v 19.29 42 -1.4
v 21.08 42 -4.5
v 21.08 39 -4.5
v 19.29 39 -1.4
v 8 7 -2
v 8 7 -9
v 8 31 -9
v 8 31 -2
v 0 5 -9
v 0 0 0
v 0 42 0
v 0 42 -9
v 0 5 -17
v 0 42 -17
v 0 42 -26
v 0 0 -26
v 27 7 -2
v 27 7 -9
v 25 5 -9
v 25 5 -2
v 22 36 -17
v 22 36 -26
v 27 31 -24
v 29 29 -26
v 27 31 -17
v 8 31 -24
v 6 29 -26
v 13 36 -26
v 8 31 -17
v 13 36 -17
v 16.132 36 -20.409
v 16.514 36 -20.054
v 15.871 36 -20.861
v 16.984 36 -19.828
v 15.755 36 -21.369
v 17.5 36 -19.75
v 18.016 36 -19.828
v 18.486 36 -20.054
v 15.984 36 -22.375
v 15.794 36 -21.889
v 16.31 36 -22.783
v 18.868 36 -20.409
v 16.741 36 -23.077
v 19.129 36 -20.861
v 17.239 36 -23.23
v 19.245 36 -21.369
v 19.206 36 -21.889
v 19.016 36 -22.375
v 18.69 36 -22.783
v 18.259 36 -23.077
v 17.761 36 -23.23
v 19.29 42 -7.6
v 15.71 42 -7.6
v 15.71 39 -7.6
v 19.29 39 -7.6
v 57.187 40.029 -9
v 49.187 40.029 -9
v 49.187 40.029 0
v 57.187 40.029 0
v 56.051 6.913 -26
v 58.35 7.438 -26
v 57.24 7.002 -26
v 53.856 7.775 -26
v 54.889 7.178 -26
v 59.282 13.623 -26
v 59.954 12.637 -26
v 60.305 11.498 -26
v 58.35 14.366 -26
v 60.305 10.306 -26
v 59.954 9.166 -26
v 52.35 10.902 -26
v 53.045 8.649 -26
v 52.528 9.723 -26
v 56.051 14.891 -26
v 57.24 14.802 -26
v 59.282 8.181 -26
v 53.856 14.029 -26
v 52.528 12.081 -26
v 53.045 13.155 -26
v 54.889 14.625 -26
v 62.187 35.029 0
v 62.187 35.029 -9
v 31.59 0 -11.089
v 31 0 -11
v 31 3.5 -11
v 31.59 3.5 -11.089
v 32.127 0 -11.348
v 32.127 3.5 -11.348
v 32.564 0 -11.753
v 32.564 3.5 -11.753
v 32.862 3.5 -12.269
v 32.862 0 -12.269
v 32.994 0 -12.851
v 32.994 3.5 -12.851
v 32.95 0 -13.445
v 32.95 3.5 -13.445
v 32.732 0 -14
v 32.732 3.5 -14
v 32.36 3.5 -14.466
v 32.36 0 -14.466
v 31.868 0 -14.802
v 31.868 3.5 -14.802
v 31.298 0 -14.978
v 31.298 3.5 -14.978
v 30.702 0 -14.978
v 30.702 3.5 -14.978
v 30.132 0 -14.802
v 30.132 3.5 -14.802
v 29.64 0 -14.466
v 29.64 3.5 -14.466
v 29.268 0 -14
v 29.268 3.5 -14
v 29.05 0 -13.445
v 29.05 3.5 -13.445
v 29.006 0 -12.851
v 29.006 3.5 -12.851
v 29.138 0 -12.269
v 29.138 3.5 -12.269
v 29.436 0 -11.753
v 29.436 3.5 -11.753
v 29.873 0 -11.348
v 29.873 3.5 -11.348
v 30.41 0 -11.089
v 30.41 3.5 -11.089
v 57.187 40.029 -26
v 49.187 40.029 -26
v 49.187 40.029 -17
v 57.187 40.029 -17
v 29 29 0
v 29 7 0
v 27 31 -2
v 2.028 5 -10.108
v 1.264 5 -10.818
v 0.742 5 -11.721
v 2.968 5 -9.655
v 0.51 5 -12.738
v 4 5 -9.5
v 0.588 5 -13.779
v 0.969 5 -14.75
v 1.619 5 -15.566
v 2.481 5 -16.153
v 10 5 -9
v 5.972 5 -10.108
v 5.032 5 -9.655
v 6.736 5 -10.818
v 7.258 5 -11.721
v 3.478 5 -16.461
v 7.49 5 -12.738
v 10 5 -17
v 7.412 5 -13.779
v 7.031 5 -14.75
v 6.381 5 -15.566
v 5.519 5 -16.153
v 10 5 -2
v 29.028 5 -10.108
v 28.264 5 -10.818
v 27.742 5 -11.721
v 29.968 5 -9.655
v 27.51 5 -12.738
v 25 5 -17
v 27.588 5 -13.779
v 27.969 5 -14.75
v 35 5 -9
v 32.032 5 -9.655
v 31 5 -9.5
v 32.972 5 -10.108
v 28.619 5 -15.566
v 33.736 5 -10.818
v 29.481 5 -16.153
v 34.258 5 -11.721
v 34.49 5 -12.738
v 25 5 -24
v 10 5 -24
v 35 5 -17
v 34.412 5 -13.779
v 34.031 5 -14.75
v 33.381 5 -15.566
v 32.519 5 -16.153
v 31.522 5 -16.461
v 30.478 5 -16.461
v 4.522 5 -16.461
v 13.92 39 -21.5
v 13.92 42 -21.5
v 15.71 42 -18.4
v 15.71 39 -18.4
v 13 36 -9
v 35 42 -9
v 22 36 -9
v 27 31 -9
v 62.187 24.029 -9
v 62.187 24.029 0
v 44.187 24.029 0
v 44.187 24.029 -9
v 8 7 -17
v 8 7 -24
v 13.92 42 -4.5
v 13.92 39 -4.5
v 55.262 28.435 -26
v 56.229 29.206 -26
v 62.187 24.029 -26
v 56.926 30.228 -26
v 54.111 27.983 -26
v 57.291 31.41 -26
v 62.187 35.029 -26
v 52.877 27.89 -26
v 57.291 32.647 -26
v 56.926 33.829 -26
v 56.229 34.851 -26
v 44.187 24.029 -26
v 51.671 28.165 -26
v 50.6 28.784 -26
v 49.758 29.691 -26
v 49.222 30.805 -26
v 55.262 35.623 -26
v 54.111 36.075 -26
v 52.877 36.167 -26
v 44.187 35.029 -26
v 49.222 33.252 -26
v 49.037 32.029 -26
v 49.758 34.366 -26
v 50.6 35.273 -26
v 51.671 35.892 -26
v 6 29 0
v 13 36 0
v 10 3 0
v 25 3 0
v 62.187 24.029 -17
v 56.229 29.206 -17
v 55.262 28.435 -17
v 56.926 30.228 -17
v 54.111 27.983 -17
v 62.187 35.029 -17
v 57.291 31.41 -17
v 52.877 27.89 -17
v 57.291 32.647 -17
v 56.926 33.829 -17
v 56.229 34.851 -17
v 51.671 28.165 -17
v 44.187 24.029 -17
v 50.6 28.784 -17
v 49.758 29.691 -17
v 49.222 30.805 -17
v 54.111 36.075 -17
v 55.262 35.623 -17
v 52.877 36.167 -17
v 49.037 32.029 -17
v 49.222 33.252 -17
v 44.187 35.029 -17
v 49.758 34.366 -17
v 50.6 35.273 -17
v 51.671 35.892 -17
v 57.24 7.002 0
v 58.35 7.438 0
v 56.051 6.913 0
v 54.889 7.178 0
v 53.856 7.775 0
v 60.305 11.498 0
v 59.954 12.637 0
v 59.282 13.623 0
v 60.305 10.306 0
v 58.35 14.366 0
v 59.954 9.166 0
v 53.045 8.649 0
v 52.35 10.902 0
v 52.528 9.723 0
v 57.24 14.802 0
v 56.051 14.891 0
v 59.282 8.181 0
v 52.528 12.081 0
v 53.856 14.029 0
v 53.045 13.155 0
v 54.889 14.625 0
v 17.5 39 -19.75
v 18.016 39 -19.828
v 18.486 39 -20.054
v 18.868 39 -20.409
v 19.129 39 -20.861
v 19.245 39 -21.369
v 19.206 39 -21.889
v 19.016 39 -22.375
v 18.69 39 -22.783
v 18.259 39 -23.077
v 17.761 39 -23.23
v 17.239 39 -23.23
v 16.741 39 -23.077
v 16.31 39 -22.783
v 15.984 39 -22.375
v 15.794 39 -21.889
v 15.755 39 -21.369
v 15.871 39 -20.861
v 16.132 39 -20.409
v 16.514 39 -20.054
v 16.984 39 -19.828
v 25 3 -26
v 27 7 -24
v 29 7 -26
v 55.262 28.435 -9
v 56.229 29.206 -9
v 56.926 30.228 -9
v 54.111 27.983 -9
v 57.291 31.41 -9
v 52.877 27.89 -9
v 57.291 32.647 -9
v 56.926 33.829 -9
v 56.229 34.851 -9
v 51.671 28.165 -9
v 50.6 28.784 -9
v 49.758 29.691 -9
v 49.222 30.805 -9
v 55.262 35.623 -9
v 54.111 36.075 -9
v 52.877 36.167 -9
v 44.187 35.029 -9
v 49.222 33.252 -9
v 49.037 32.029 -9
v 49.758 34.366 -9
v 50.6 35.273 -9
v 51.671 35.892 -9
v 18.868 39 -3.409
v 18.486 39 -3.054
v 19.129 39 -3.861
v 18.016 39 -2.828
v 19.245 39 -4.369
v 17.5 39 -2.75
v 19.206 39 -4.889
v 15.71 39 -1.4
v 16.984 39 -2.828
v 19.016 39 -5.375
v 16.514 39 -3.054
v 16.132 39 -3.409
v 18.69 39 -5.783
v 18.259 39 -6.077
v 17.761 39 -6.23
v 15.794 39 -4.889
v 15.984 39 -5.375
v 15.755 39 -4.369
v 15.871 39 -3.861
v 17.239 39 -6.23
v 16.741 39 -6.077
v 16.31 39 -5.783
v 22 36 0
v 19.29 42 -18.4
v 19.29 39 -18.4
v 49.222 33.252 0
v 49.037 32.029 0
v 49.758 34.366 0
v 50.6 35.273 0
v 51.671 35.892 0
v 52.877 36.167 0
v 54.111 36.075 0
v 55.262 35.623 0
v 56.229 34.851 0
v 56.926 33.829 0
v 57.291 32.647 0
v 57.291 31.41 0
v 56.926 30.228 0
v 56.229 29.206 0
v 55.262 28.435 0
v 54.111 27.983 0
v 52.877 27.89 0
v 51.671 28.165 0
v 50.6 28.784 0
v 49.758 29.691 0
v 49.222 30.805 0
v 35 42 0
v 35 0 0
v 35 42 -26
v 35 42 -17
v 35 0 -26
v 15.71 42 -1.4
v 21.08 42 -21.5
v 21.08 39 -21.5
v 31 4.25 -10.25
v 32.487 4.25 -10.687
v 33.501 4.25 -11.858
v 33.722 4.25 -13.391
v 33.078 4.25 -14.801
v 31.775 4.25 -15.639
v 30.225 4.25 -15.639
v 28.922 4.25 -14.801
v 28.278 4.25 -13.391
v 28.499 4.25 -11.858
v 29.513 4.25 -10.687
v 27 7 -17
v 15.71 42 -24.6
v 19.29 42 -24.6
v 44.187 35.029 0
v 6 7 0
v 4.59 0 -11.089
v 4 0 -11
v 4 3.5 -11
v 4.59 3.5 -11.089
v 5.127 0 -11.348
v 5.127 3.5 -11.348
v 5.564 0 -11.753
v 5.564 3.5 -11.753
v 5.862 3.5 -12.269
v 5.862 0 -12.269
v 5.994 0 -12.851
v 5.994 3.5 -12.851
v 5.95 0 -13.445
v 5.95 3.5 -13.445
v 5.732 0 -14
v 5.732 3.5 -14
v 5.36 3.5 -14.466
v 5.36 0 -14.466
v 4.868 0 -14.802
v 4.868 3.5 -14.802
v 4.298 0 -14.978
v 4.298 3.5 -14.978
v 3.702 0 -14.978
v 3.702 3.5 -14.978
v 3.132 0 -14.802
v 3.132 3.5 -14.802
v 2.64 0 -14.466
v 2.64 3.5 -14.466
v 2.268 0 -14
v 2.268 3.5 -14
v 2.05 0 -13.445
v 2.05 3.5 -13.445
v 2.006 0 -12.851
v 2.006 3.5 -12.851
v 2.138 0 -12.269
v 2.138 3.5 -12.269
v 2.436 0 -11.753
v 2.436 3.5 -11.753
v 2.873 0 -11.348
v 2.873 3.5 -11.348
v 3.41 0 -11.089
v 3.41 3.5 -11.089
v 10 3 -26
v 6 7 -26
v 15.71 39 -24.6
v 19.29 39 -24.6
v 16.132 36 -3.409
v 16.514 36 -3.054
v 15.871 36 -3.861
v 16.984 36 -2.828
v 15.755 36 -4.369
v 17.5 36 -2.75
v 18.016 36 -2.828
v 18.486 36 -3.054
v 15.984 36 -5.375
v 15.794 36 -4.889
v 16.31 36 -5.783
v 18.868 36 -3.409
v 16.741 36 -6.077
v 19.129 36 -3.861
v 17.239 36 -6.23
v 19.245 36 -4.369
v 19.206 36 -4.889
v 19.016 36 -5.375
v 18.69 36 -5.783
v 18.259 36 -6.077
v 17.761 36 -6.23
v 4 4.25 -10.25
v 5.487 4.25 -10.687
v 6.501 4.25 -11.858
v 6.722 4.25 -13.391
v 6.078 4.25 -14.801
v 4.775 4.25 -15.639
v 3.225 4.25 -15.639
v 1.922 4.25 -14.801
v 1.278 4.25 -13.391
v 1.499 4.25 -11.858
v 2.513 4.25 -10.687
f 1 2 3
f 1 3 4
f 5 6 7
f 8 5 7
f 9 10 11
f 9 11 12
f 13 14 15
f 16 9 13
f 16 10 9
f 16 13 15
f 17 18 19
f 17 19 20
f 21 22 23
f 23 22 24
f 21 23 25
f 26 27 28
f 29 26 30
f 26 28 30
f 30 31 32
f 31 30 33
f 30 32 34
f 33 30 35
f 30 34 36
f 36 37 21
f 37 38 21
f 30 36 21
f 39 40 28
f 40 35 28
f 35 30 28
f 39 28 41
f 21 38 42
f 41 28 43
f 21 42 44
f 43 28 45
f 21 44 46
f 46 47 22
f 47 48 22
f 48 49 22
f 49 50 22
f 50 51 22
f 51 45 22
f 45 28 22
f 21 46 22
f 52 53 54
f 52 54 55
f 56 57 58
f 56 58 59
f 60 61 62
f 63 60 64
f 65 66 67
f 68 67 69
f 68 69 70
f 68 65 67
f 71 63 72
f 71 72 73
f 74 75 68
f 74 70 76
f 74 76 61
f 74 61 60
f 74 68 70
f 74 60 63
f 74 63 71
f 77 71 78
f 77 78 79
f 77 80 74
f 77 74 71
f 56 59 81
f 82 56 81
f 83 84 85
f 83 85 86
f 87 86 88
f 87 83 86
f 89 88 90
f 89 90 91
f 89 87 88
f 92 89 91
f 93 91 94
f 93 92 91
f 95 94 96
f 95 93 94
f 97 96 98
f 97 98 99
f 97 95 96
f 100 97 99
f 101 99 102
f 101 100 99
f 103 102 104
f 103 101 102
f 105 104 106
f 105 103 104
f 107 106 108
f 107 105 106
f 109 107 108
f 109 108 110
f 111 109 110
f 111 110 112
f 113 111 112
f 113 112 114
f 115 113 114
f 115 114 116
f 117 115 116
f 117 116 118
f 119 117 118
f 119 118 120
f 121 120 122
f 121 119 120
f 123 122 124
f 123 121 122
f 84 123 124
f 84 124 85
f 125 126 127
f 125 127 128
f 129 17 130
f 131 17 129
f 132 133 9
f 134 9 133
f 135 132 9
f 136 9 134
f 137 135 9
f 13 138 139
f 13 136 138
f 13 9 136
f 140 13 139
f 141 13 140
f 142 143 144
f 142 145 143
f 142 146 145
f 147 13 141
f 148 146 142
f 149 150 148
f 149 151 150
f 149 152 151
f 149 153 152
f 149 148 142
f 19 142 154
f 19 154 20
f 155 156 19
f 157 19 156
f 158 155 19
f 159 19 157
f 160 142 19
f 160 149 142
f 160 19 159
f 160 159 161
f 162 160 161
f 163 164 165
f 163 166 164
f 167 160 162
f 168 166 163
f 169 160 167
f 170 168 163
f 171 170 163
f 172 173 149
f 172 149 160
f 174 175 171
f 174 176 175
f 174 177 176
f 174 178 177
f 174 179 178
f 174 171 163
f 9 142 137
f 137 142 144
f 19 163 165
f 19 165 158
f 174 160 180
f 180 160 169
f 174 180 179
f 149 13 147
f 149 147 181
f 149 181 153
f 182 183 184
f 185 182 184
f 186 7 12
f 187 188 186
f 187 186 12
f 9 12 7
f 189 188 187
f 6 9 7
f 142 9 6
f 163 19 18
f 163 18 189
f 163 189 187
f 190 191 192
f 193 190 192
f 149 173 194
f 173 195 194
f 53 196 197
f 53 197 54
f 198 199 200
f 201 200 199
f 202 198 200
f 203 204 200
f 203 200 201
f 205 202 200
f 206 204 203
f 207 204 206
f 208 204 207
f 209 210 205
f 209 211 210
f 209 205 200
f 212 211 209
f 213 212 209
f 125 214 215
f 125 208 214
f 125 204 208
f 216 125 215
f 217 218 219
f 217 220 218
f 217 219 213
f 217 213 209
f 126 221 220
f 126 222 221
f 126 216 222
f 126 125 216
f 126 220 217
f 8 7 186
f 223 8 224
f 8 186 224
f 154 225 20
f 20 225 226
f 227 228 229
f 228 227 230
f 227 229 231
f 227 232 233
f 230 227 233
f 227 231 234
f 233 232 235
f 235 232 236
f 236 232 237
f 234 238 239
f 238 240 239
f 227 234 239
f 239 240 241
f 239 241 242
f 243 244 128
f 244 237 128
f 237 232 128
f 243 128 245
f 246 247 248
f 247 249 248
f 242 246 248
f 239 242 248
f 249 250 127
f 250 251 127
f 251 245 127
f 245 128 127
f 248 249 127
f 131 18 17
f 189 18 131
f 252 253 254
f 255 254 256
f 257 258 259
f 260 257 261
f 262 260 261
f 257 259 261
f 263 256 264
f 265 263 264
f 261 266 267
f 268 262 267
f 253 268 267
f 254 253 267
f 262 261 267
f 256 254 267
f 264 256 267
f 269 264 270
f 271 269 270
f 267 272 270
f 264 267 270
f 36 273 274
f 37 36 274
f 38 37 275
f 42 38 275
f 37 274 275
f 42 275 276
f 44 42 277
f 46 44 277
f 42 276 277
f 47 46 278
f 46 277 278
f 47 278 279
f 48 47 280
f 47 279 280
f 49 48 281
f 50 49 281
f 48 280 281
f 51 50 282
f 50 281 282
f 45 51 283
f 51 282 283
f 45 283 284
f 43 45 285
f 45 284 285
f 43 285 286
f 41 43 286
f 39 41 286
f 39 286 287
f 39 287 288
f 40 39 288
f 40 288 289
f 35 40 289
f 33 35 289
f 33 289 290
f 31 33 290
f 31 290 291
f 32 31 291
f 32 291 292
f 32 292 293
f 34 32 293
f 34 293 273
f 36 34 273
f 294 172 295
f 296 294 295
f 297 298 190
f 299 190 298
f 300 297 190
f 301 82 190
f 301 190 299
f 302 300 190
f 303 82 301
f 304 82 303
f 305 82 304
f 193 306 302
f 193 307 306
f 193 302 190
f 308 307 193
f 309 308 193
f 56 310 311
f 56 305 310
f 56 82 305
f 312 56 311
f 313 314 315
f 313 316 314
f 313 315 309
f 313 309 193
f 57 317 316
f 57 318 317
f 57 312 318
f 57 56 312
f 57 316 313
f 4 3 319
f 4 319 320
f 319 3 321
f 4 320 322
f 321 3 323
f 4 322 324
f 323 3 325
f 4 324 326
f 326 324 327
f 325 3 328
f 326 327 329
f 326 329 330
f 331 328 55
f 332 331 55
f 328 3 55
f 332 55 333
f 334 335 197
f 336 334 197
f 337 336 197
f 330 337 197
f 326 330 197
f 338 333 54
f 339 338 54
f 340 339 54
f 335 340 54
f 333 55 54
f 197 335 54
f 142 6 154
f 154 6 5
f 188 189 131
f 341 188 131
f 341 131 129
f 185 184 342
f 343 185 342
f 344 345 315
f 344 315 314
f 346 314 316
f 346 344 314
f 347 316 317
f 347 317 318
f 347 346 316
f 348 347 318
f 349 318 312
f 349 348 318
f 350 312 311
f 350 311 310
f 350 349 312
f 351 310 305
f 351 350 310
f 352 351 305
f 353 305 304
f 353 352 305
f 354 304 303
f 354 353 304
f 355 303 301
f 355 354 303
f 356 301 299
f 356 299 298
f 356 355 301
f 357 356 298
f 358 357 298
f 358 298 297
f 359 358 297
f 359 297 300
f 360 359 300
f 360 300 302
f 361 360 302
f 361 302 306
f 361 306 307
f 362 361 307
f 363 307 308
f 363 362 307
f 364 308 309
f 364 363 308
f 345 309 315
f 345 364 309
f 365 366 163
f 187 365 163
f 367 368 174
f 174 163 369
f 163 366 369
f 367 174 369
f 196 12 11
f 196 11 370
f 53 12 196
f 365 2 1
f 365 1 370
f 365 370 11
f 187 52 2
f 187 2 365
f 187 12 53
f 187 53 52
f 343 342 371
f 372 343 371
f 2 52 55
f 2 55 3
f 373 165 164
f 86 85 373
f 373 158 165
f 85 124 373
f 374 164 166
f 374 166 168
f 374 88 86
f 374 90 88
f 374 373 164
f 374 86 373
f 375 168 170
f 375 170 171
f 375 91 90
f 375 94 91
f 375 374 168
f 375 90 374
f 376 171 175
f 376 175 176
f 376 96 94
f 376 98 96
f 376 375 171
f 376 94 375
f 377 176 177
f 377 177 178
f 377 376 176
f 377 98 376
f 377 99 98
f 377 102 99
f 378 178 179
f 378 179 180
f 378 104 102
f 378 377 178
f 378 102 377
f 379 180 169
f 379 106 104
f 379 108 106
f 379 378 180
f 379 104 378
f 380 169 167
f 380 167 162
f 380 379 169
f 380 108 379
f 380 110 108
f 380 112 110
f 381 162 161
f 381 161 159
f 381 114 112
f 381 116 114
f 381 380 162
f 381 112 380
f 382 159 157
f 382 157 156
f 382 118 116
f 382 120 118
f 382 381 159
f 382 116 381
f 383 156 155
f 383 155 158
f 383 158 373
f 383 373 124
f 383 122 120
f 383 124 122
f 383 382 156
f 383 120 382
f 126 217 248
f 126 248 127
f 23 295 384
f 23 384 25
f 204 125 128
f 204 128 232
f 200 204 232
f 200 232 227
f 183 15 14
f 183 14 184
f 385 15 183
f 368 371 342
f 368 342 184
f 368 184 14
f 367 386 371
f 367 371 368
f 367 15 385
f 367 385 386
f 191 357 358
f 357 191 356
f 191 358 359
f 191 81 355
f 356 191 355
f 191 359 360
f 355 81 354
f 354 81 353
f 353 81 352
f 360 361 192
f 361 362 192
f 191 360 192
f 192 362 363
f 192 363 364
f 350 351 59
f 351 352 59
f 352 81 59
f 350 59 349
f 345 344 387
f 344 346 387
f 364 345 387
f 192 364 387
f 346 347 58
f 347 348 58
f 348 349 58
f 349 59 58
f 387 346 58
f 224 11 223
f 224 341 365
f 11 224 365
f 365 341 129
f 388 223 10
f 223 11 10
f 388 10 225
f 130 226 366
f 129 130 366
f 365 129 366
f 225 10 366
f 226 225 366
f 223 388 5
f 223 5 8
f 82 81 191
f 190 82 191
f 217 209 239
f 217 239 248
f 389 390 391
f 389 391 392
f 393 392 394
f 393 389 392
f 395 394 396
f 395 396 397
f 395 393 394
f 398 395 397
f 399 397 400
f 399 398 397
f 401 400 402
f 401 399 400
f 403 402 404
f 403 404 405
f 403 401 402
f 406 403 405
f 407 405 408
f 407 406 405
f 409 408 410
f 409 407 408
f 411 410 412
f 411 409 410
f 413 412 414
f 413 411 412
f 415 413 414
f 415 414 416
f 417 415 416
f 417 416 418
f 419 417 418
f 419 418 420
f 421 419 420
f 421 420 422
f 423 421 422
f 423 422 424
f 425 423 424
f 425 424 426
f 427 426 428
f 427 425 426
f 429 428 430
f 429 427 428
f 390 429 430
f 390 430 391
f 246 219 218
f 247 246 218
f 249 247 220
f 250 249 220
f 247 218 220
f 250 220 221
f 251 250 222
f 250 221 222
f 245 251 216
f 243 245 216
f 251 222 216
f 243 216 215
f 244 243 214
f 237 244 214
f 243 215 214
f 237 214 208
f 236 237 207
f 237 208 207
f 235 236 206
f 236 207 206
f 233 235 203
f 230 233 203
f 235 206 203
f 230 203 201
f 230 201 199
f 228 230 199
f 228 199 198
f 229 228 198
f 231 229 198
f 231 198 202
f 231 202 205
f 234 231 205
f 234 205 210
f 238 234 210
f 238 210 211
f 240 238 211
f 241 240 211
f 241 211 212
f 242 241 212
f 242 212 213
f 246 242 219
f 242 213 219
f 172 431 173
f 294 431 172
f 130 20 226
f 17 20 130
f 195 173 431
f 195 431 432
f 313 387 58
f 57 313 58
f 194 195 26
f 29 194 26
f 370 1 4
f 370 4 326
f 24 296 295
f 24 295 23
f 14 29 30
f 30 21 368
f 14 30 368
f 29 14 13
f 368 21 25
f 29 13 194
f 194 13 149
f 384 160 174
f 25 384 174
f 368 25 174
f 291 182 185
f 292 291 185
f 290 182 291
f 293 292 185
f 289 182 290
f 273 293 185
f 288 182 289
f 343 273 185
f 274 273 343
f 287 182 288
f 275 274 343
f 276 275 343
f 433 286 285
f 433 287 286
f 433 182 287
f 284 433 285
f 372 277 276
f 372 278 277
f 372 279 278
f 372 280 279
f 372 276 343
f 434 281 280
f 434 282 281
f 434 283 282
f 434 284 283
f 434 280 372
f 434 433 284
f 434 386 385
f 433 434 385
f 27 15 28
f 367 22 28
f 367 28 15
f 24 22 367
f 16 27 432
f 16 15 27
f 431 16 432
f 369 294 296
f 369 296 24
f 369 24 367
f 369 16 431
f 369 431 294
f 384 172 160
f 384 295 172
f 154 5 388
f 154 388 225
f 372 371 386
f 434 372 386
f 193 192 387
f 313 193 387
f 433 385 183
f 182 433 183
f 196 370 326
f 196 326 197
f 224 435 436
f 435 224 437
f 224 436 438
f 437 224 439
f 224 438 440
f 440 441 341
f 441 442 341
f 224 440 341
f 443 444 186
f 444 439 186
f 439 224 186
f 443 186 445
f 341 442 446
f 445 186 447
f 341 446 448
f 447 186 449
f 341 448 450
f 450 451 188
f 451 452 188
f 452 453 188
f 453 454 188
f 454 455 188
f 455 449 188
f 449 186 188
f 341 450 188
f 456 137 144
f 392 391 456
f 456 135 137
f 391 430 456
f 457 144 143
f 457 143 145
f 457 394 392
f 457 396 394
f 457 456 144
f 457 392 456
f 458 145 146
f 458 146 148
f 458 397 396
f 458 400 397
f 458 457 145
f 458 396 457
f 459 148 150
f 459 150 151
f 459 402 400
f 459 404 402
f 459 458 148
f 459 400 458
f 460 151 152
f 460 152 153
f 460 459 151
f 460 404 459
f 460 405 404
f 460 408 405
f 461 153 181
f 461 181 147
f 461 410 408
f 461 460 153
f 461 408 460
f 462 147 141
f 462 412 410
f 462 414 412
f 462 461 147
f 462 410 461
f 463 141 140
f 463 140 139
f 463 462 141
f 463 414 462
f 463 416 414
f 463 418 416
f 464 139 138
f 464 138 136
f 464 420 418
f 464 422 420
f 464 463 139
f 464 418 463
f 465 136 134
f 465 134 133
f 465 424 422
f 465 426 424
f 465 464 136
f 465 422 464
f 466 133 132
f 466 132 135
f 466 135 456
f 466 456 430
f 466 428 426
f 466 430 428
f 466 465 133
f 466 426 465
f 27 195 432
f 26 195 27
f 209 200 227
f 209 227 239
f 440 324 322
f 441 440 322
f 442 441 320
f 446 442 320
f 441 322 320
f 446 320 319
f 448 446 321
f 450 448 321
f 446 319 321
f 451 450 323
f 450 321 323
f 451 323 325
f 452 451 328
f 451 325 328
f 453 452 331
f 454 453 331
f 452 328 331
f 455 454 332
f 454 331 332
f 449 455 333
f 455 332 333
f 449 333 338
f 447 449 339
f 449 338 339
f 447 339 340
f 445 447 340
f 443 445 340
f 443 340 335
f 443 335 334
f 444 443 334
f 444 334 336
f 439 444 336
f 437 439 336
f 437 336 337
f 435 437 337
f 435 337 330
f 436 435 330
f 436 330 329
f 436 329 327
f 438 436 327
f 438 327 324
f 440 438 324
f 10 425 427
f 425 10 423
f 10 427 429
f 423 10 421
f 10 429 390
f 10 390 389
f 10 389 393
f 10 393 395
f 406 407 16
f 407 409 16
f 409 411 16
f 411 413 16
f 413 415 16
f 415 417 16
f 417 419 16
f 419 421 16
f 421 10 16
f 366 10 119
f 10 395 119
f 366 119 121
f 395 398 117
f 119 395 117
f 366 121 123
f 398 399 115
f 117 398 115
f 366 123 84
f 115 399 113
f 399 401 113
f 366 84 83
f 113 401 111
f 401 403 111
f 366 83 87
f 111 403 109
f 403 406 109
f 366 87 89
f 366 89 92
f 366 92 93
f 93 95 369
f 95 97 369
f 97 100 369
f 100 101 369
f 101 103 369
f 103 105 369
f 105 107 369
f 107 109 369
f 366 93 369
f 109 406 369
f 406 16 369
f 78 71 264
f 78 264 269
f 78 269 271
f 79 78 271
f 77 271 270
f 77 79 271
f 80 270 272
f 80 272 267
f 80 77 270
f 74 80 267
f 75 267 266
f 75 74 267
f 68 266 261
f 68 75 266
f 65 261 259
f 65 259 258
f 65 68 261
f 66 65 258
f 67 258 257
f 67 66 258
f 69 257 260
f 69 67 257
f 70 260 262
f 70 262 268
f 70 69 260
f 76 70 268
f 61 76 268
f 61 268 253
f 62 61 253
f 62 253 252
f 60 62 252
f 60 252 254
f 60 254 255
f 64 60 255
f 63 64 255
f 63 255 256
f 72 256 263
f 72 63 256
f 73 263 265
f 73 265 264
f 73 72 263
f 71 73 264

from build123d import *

# Parameters (mm, degrees)
SKETCH1_W               = 35
SKETCH1_H               = 9
SKETCH1_H_2             = 8
SKETCH1_R               = 2
SKETCH1_R_2             = 1.75
BOSS_EXTRUDE1_DEPTH     = 5
SKETCH1_3_W             = 35
SKETCH1_3_H             = 9
SKETCH1_3_R             = 1.75
BOSS_EXTRUDE2_DEPTH     = 42
CUT_EXTRUDE1_START      = 42
SKETCH1_4_R             = 1.75
CUT_EXTRUDE1_DEPTH      = 3
CUT_EXTRUDE2_START      = 42
SKETCH1_5_R             = 1.75
CUT_EXTRUDE2_DEPTH      = 37
CUT_EXTRUDE3_DEPTH      = 61.539243471
CUT_EXTRUDE3_DEPTH_BACK = 61.539243471
SKETCH2_W               = 19
SKETCH2_H               = 31
SKETCH2_R               = 4.15
CHAMFER1_SIZE           = 5
SKETCH3_R               = 4.15
BOSS_EXTRUDE3_DEPTH     = 9
CHAMFER2_SIZE           = 1.5
SKETCH4_R               = 4
BOSS_EXTRUDE4_DEPTH     = 26
CHAMFER3_SIZE           = 2


with BuildPart() as part:
    # Sketch1 → Boss-Extrude1 (new body)
    # profile 1 of 7: a face of its own
    with BuildSketch(Plane(origin=(0, 0, 0), x_dir=(1, 0, 0), z_dir=(0, 1, 0))):
        with Locations((17.5, 21.5)):
            Rectangle(SKETCH1_W, SKETCH1_H)
        Polygon((19.289785834, 18.4), (15.710214166, 18.4), (13.920428331, 21.5), (15.710214166, 24.6), (19.289785834, 24.6), (21.079571669, 21.5), align=None, mode=Mode.SUBTRACT)
    # profile 2 of 7: a face of its own
    with BuildSketch(Plane(origin=(0, 0, 0), x_dir=(1, 0, 0), z_dir=(0, 1, 0))):
        with Locations((17.5, 13)):
            Rectangle(SKETCH1_W, SKETCH1_H_2)
        with Locations(Location((4, 13, 0), (0, 0, 270))):
            Circle(SKETCH1_R, mode=Mode.SUBTRACT)
        with Locations(Location((31, 13, 0), (0, 0, 270))):
            Circle(SKETCH1_R, mode=Mode.SUBTRACT)
    # profile 3 of 7: a face of its own
    with BuildSketch(Plane(origin=(0, 0, 0), x_dir=(1, 0, 0), z_dir=(0, 1, 0))):
        with Locations((17.5, 4.5)):
            Rectangle(SKETCH1_W, SKETCH1_H)
        Polygon((19.289785834, 7.6), (21.079571669, 4.5), (19.289785834, 1.4), (15.710214166, 1.4), (13.920428331, 4.5), (15.710214166, 7.6), align=None, mode=Mode.SUBTRACT)
    # profile 4 of 7: a face of its own
    with BuildSketch(Plane(origin=(0, 0, 0), x_dir=(1, 0, 0), z_dir=(0, 1, 0))):
        Polygon((15.710214166, 24.6), (13.920428331, 21.5), (15.710214166, 18.4), (19.289785834, 18.4), (21.079571669, 21.5), (19.289785834, 24.6), align=None)
        with Locations((17.5, 21.5)):
            Circle(SKETCH1_R_2, mode=Mode.SUBTRACT)
    # profile 5 of 7: a face of its own
    with BuildSketch(Plane(origin=(0, 0, 0), x_dir=(1, 0, 0), z_dir=(0, 1, 0))):
        Polygon((19.289785834, 1.4), (15.710214166, 1.4), (13.920428331, 4.5), (15.710214166, 7.6), (19.289785834, 7.6), (21.079571669, 4.5), align=None)
        with Locations((17.5, 4.5)):
            Circle(SKETCH1_R_2, mode=Mode.SUBTRACT)
    # profile 6 of 7: a face of its own
    with BuildSketch(Plane(origin=(0, 0, 0), x_dir=(1, 0, 0), z_dir=(0, 1, 0))):
        with Locations((17.5, 4.5)):
            Circle(SKETCH1_R_2)
    # profile 7 of 7: a face of its own
    with BuildSketch(Plane(origin=(0, 0, 0), x_dir=(1, 0, 0), z_dir=(0, 1, 0))):
        with Locations((17.5, 21.5)):
            Circle(SKETCH1_R_2)
    extrude(amount=BOSS_EXTRUDE1_DEPTH)

    # Sketch1<3> → Boss-Extrude2 (add)
    # profile 1 of 6: a face of its own
    with BuildSketch(Plane(origin=(0, 0, 0), x_dir=(1, 0, 0), z_dir=(0, 1, 0))):
        with Locations((17.5, 21.5)):
            Rectangle(SKETCH1_3_W, SKETCH1_3_H)
        Polygon((19.289785834, 18.4), (15.710214166, 18.4), (13.920428331, 21.5), (15.710214166, 24.6), (19.289785834, 24.6), (21.079571669, 21.5), align=None, mode=Mode.SUBTRACT)
    # profile 2 of 6: a face of its own
    with BuildSketch(Plane(origin=(0, 0, 0), x_dir=(1, 0, 0), z_dir=(0, 1, 0))):
        with Locations((17.5, 4.5)):
            Rectangle(SKETCH1_3_W, SKETCH1_3_H)
        Polygon((19.289785834, 7.6), (21.079571669, 4.5), (19.289785834, 1.4), (15.710214166, 1.4), (13.920428331, 4.5), (15.710214166, 7.6), align=None, mode=Mode.SUBTRACT)
    # profile 3 of 6: a face of its own
    with BuildSketch(Plane(origin=(0, 0, 0), x_dir=(1, 0, 0), z_dir=(0, 1, 0))):
        Polygon((15.710214166, 24.6), (13.920428331, 21.5), (15.710214166, 18.4), (19.289785834, 18.4), (21.079571669, 21.5), (19.289785834, 24.6), align=None)
        with Locations((17.5, 21.5)):
            Circle(SKETCH1_3_R, mode=Mode.SUBTRACT)
    # profile 4 of 6: a face of its own
    with BuildSketch(Plane(origin=(0, 0, 0), x_dir=(1, 0, 0), z_dir=(0, 1, 0))):
        Polygon((19.289785834, 1.4), (15.710214166, 1.4), (13.920428331, 4.5), (15.710214166, 7.6), (19.289785834, 7.6), (21.079571669, 4.5), align=None)
        with Locations((17.5, 4.5)):
            Circle(SKETCH1_3_R, mode=Mode.SUBTRACT)
    # profile 5 of 6: a face of its own
    with BuildSketch(Plane(origin=(0, 0, 0), x_dir=(1, 0, 0), z_dir=(0, 1, 0))):
        with Locations((17.5, 4.5)):
            Circle(SKETCH1_3_R)
    # profile 6 of 6: a face of its own
    with BuildSketch(Plane(origin=(0, 0, 0), x_dir=(1, 0, 0), z_dir=(0, 1, 0))):
        with Locations((17.5, 21.5)):
            Circle(SKETCH1_3_R)
    extrude(amount=BOSS_EXTRUDE2_DEPTH)

    # Sketch1<4> → Cut-Extrude1 (cut)
    # profile 1 of 4: a face of its own
    with BuildSketch(Plane(origin=(0, 0, 0), x_dir=(1, 0, 0), z_dir=(0, 1, 0)).offset(CUT_EXTRUDE1_START)):
        Polygon((15.710214166, 24.6), (13.920428331, 21.5), (15.710214166, 18.4), (19.289785834, 18.4), (21.079571669, 21.5), (19.289785834, 24.6), align=None)
        with Locations((17.5, 21.5)):
            Circle(SKETCH1_4_R, mode=Mode.SUBTRACT)
    # profile 2 of 4: a face of its own
    with BuildSketch(Plane(origin=(0, 0, 0), x_dir=(1, 0, 0), z_dir=(0, 1, 0)).offset(CUT_EXTRUDE1_START)):
        Polygon((19.289785834, 1.4), (15.710214166, 1.4), (13.920428331, 4.5), (15.710214166, 7.6), (19.289785834, 7.6), (21.079571669, 4.5), align=None)
        with Locations((17.5, 4.5)):
            Circle(SKETCH1_4_R, mode=Mode.SUBTRACT)
    # profile 3 of 4: a face of its own
    with BuildSketch(Plane(origin=(0, 0, 0), x_dir=(1, 0, 0), z_dir=(0, 1, 0)).offset(CUT_EXTRUDE1_START)):
        with Locations((17.5, 4.5)):
            Circle(SKETCH1_4_R)
    # profile 4 of 4: a face of its own
    with BuildSketch(Plane(origin=(0, 0, 0), x_dir=(1, 0, 0), z_dir=(0, 1, 0)).offset(CUT_EXTRUDE1_START)):
        with Locations((17.5, 21.5)):
            Circle(SKETCH1_4_R)
    extrude(amount=-CUT_EXTRUDE1_DEPTH, mode=Mode.SUBTRACT)

    # Sketch1<5> → Cut-Extrude2 (cut)
    with BuildSketch(Plane(origin=(0, 0, 0), x_dir=(1, 0, 0), z_dir=(0, 1, 0)).offset(CUT_EXTRUDE2_START)):
        with Locations(Location((17.5, 21.5, 0), (0, 0, 270))):
            Circle(SKETCH1_5_R)
        with Locations(Location((17.5, 4.5, 0), (0, 0, 270))):
            Circle(SKETCH1_5_R)
    extrude(amount=-CUT_EXTRUDE2_DEPTH, mode=Mode.SUBTRACT)

    # Sketch2 → Cut-Extrude3 (cut, two sides: drawn at the far end of the back side and taken through both)
    # profile 1 of 2: a face of its own
    with BuildSketch(Plane.XY.offset(-CUT_EXTRUDE3_DEPTH_BACK)):
        with Locations((17.5, 20.5)):
            Rectangle(SKETCH2_W, SKETCH2_H)
        with Locations((17.5, 28)):
            Circle(SKETCH2_R, mode=Mode.SUBTRACT)
    # profile 2 of 2: a face of its own
    with BuildSketch(Plane.XY.offset(-CUT_EXTRUDE3_DEPTH_BACK)):
        with Locations((17.5, 28)):
            Circle(SKETCH2_R)
    extrude(amount=CUT_EXTRUDE3_DEPTH + CUT_EXTRUDE3_DEPTH_BACK, mode=Mode.SUBTRACT)

    # Chamfer1
    chamfer1_edges = [part.edges().sort_by_distance(p)[0] for p in [
        (27, 36, -4.5),
        (27, 36, -21.5),
        (8, 36, -4.5),
        (8, 36, -21.5),
    ]]
    chamfer(chamfer1_edges, length=CHAMFER1_SIZE)

    # Chamfer2
    chamfer2_edges = [part.edges().sort_by_distance(p)[0] for p in [
        (4, 5, -15),
        (31, 5, -15),
    ]]
    chamfer(chamfer2_edges, length=CHAMFER2_SIZE)

    # Chamfer3
    chamfer3_edges = [part.edges().sort_by_distance(p)[0] for p in [
        (8, 5, -4.5),
        (8, 18, 0),
        (8, 5, -21.5),
        (27, 5, -4.5),
        (17.5, 5, 0),
        (27, 5, -21.5),
        (17.5, 5, -26),
        (27, 18, 0),
        (8, 18, -26),
        (27, 18, -26),
    ]]
    chamfer(chamfer3_edges, length=CHAMFER3_SIZE)


with BuildPart() as body_2:
    # Sketch3 → Boss-Extrude3 (new body)
    with BuildSketch(Plane(origin=(0, 0, -26), x_dir=(-1, 0, 0), z_dir=(0, 0, -1))):
        Polygon((-57.187304591, 40.028562954), (-62.187304591, 35.028562954), (-62.187304591, 24.028562954), (-44.187304591, 24.028562954), (-44.187304591, 35.028562954), (-49.187304591, 40.028562954), align=None)
        with Locations((-53.187304591, 32.028562954)):
            Circle(SKETCH3_R, mode=Mode.SUBTRACT)
    extrude(amount=-BOSS_EXTRUDE3_DEPTH)


with BuildPart() as body_3:
    # Mirror2: mirrored copy
    add(body_2.part.mirror(Plane(origin=(0, 0, -13), x_dir=(1, 0, 0), z_dir=(0, 0, -1))))


with BuildPart() as body_4:
    # Sketch4 → Boss-Extrude4 (new body)
    with BuildSketch(Plane(origin=(0, 0, -26), x_dir=(-1, 0, 0), z_dir=(0, 0, -1))):
        with Locations((-56.349896332, 10.901949066)):
            Circle(SKETCH4_R)
    extrude(amount=-BOSS_EXTRUDE4_DEPTH)


solid = Compound([part.part, body_2.part, body_3.part, body_4.part])
